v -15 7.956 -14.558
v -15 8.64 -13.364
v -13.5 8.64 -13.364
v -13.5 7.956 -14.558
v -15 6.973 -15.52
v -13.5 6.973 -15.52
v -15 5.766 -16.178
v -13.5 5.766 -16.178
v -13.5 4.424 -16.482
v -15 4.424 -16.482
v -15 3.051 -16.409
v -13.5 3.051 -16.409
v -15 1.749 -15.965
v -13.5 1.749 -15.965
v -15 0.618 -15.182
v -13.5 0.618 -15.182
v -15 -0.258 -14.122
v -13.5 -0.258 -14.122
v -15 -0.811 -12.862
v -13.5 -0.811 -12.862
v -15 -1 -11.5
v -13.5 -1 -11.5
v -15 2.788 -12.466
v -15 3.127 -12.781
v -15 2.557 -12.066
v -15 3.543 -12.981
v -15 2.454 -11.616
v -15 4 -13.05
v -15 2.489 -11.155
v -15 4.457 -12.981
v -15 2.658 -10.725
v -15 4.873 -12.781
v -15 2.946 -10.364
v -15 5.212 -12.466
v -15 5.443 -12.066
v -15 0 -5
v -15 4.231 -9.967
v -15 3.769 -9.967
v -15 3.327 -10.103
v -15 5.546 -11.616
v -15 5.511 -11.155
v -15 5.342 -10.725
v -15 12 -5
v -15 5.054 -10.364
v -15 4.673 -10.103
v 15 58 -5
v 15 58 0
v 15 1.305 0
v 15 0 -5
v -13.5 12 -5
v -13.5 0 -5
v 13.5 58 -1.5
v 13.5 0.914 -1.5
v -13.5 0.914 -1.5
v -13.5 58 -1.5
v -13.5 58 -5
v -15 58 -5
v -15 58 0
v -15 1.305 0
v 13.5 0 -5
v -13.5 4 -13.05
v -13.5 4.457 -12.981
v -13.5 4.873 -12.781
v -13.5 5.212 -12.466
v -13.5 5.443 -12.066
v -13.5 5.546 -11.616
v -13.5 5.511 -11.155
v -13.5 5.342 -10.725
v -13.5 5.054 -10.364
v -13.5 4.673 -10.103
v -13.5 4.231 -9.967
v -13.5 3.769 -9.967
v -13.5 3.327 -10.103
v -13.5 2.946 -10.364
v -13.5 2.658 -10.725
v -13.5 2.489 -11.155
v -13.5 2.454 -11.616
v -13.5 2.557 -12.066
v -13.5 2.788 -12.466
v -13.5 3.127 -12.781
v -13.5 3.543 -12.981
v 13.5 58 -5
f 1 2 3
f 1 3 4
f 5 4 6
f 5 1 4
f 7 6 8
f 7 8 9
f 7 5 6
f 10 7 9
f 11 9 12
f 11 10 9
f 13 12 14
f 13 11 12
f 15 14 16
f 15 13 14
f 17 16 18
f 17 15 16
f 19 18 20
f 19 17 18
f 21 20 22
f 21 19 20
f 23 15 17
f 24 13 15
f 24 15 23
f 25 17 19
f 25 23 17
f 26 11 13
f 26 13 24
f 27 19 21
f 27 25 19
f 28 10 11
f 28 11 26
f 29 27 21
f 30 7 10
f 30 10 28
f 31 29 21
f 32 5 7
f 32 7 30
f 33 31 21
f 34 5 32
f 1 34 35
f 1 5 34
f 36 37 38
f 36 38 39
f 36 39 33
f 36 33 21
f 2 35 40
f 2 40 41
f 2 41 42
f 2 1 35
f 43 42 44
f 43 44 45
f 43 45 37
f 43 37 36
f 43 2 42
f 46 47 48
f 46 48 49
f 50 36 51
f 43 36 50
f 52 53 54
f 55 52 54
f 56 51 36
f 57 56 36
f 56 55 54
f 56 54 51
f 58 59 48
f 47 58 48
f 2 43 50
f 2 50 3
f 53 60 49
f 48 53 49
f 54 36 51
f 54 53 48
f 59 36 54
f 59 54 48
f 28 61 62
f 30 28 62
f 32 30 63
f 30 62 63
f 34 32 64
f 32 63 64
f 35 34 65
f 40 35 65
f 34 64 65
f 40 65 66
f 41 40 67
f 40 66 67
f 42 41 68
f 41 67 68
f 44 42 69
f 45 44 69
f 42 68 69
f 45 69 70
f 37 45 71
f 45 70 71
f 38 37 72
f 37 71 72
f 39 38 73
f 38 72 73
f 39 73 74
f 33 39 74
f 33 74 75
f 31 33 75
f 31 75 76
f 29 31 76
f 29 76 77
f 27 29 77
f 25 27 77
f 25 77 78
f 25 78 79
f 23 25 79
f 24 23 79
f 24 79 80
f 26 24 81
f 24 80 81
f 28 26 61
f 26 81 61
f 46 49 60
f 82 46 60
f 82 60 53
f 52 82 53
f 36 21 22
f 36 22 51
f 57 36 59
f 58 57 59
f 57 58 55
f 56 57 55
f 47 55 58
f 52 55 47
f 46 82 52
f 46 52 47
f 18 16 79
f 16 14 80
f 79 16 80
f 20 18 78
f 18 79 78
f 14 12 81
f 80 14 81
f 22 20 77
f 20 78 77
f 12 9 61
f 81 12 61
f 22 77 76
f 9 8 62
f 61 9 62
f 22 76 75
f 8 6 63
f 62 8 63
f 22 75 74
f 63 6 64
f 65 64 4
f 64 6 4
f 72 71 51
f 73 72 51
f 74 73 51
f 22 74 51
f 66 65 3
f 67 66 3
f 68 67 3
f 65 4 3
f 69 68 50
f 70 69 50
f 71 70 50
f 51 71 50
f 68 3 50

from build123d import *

# Parameters (mm, degrees)
EXTRUDE_1_DEPTH     = 58
EXTRUDE_2_DEPTH     = 1.5
SKETCH_3_R          = 1.55
CUT_EXTRUDE_1_DEPTH = 1.5
CUT_EXTRUDE_2_DEPTH = 31


with BuildPart() as part:
    # 草图1 → 凸台-拉伸1 (new body)
    with BuildSketch(Plane(origin=(0, 0, 0), x_dir=(1, 0, 0), z_dir=(0, 1, 0))):
        Polygon((-15, 0), (15, 0), (15, 5), (13.5, 5), (13.5, 1.5), (-13.5, 1.5), (-13.5, 5), (-15, 5), align=None)
    extrude(amount=EXTRUDE_1_DEPTH)

    # 草图4 → 切除-拉伸2 (cut, through all)
    with BuildSketch(Plane.ZY.offset(15)):
        Polygon((-5, 0), (0, 1.305091324), (0, 0), align=None)
    extrude(amount=-CUT_EXTRUDE_2_DEPTH, mode=Mode.SUBTRACT)


with BuildPart() as body_2:
    # 草图2 → 凸台-拉伸2 (new body)
    with BuildSketch(Plane.ZY.offset(15)):
        with BuildLine():
            Line((-5, 12), (-13.364048259, 8.639539211))
            ThreePointArc((-13.364048259, 8.639539211), (-16.409057753, 3.050709753), (-11.5, -1))
            Line((-11.5, -1), (-5, 0))
            Line((-5, 0), (-5, 12))
        make_face()
    extrude(amount=-EXTRUDE_2_DEPTH)

    # 草图3 → 切除-拉伸1 (cut)
    with BuildSketch(Plane(origin=(-13.5, 0, 0), x_dir=(0, 0, -1), z_dir=(1, 0, 0))):
        with Locations((11.5, 4)):
            Circle(SKETCH_3_R)
    extrude(amount=-CUT_EXTRUDE_1_DEPTH, mode=Mode.SUBTRACT)


solid = Compound([part.part, body_2.part])
